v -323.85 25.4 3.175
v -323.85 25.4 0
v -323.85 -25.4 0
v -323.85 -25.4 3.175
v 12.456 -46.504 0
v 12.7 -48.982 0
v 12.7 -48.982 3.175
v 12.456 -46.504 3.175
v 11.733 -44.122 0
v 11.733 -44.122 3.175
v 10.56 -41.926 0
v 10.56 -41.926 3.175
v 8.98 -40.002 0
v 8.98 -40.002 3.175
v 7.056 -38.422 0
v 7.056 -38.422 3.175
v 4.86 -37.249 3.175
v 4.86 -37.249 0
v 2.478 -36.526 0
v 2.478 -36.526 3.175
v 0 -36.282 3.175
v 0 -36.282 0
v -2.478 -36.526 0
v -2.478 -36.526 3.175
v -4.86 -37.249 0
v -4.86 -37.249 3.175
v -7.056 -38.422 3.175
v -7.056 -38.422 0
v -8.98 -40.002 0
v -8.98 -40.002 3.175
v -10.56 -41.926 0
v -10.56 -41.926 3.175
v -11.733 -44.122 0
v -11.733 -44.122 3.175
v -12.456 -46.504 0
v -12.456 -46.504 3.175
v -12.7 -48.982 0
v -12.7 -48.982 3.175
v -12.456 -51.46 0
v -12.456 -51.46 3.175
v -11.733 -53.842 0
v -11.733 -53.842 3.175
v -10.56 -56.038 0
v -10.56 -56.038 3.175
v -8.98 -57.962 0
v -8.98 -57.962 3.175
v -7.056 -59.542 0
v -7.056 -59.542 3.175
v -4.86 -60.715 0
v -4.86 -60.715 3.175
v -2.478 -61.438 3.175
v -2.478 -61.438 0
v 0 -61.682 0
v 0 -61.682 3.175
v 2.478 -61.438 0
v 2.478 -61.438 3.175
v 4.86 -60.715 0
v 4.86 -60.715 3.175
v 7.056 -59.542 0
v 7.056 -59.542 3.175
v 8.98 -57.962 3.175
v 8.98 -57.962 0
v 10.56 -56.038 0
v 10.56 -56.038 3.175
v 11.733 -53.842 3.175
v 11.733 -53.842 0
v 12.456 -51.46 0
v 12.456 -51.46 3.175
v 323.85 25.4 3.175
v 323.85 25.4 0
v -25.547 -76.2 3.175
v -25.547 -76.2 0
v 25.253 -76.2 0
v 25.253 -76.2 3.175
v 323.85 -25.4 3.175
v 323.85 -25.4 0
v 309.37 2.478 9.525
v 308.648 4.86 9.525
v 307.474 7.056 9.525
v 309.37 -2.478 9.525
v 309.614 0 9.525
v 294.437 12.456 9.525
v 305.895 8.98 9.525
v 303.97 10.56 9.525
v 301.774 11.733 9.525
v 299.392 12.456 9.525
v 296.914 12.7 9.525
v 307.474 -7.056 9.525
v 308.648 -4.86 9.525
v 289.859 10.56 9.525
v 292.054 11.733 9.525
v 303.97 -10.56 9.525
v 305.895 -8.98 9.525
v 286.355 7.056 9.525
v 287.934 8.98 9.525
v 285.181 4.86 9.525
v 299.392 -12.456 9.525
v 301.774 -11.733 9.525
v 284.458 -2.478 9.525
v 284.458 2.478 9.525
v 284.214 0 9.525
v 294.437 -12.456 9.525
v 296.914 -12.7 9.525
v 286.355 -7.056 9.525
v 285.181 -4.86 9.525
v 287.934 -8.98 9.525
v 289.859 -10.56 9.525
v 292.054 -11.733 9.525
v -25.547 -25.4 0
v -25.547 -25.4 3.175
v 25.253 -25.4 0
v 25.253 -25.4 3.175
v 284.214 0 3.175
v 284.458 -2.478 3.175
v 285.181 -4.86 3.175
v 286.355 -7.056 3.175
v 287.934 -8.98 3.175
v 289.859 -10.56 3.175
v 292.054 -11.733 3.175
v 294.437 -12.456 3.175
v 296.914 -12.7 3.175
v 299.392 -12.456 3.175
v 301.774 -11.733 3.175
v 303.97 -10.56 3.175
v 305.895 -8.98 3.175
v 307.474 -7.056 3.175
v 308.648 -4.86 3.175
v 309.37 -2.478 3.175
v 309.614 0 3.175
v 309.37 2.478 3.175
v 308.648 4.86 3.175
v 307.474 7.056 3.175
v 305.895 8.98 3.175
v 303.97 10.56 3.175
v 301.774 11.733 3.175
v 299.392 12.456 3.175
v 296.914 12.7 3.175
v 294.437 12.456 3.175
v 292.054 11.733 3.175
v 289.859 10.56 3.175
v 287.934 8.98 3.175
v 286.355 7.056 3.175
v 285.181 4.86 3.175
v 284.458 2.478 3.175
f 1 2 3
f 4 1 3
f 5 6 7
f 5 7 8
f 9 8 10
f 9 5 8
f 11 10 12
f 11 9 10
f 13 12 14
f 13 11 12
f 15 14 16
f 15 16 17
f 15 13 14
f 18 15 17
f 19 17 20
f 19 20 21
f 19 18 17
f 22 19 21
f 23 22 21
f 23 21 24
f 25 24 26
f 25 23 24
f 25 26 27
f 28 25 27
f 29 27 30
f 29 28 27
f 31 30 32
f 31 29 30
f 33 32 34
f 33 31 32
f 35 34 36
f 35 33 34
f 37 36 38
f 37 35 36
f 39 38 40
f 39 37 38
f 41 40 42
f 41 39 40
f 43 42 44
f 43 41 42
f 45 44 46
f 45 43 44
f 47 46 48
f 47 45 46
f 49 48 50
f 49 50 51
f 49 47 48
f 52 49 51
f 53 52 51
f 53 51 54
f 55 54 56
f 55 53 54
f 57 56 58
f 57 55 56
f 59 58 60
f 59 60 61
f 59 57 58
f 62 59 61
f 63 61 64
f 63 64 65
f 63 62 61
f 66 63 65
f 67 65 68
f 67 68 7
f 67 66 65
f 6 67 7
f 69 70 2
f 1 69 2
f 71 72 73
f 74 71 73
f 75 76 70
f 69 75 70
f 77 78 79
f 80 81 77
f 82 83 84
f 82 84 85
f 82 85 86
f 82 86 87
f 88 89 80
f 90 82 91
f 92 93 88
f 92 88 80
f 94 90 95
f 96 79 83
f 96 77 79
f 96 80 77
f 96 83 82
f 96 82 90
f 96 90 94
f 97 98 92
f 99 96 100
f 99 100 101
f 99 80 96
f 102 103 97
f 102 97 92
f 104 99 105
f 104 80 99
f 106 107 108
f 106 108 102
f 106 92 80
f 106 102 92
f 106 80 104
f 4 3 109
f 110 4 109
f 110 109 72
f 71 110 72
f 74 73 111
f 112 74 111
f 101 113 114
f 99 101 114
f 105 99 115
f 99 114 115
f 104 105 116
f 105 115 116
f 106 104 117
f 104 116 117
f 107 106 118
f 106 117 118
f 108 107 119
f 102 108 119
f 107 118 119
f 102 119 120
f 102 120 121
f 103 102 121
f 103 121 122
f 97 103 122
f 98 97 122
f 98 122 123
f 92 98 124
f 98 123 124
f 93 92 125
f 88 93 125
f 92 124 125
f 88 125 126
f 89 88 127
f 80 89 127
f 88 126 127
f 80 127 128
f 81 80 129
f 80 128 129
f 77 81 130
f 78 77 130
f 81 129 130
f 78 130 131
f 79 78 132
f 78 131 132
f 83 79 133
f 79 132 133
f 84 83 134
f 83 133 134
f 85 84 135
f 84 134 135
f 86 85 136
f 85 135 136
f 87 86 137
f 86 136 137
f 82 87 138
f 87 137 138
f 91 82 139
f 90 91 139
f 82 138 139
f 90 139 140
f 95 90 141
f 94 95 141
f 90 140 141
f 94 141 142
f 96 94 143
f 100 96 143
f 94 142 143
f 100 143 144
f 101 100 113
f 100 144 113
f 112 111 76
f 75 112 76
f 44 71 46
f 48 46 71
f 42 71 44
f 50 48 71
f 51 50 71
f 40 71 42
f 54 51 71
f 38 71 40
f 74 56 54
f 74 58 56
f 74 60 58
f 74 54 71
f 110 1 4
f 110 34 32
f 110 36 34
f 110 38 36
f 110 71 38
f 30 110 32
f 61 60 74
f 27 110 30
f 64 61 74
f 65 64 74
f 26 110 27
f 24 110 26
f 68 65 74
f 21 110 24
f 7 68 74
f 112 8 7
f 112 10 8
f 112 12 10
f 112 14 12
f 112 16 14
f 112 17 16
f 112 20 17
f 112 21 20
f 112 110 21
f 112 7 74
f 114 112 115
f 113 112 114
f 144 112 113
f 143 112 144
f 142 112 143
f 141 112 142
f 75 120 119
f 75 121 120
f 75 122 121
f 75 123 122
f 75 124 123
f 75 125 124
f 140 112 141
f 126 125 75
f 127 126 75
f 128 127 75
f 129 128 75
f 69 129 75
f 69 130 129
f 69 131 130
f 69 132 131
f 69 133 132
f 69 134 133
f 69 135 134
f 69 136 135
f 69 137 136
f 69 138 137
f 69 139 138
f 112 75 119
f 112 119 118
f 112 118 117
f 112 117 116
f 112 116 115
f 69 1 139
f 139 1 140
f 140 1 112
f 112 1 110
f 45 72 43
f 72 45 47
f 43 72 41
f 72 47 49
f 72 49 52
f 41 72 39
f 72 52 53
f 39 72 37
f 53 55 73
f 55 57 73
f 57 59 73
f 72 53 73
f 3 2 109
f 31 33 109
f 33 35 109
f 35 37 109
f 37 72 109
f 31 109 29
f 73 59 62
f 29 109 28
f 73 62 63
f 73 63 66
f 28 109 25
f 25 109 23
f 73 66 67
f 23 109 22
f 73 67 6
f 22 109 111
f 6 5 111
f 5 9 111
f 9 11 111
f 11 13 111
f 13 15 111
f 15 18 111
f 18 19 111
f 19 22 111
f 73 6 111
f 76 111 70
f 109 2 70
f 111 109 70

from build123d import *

# Parameters (mm, degrees)
SKETCH1_R           = 12.7
BOSS_EXTRUDE1_DEPTH = 3.175
SKETCH2_R           = 12.7
BOSS_EXTRUDE2_DEPTH = 6.35


with BuildPart() as part:
    # Sketch1 → Boss-Extrude1 (new body)
    with BuildSketch(Plane.XY):
        Polygon((-323.85, -25.4), (-25.546675569, -25.4), (-25.546675569, -76.2), (25.253324431, -76.2), (25.253324431, -25.4), (323.85, -25.4), (323.85, 25.4), (-323.85, 25.4), align=None)
        with Locations((0, -48.981872029)):
            Circle(SKETCH1_R, mode=Mode.SUBTRACT)
    extrude(amount=BOSS_EXTRUDE1_DEPTH)

    # Sketch2 → Boss-Extrude2 (add)
    with BuildSketch(Plane.XY.offset(3.175)):
        with Locations(Location((296.914396716, 0, 0), (0, 0, 180))):
            Circle(SKETCH2_R)
    extrude(amount=BOSS_EXTRUDE2_DEPTH)


solid = part.part
